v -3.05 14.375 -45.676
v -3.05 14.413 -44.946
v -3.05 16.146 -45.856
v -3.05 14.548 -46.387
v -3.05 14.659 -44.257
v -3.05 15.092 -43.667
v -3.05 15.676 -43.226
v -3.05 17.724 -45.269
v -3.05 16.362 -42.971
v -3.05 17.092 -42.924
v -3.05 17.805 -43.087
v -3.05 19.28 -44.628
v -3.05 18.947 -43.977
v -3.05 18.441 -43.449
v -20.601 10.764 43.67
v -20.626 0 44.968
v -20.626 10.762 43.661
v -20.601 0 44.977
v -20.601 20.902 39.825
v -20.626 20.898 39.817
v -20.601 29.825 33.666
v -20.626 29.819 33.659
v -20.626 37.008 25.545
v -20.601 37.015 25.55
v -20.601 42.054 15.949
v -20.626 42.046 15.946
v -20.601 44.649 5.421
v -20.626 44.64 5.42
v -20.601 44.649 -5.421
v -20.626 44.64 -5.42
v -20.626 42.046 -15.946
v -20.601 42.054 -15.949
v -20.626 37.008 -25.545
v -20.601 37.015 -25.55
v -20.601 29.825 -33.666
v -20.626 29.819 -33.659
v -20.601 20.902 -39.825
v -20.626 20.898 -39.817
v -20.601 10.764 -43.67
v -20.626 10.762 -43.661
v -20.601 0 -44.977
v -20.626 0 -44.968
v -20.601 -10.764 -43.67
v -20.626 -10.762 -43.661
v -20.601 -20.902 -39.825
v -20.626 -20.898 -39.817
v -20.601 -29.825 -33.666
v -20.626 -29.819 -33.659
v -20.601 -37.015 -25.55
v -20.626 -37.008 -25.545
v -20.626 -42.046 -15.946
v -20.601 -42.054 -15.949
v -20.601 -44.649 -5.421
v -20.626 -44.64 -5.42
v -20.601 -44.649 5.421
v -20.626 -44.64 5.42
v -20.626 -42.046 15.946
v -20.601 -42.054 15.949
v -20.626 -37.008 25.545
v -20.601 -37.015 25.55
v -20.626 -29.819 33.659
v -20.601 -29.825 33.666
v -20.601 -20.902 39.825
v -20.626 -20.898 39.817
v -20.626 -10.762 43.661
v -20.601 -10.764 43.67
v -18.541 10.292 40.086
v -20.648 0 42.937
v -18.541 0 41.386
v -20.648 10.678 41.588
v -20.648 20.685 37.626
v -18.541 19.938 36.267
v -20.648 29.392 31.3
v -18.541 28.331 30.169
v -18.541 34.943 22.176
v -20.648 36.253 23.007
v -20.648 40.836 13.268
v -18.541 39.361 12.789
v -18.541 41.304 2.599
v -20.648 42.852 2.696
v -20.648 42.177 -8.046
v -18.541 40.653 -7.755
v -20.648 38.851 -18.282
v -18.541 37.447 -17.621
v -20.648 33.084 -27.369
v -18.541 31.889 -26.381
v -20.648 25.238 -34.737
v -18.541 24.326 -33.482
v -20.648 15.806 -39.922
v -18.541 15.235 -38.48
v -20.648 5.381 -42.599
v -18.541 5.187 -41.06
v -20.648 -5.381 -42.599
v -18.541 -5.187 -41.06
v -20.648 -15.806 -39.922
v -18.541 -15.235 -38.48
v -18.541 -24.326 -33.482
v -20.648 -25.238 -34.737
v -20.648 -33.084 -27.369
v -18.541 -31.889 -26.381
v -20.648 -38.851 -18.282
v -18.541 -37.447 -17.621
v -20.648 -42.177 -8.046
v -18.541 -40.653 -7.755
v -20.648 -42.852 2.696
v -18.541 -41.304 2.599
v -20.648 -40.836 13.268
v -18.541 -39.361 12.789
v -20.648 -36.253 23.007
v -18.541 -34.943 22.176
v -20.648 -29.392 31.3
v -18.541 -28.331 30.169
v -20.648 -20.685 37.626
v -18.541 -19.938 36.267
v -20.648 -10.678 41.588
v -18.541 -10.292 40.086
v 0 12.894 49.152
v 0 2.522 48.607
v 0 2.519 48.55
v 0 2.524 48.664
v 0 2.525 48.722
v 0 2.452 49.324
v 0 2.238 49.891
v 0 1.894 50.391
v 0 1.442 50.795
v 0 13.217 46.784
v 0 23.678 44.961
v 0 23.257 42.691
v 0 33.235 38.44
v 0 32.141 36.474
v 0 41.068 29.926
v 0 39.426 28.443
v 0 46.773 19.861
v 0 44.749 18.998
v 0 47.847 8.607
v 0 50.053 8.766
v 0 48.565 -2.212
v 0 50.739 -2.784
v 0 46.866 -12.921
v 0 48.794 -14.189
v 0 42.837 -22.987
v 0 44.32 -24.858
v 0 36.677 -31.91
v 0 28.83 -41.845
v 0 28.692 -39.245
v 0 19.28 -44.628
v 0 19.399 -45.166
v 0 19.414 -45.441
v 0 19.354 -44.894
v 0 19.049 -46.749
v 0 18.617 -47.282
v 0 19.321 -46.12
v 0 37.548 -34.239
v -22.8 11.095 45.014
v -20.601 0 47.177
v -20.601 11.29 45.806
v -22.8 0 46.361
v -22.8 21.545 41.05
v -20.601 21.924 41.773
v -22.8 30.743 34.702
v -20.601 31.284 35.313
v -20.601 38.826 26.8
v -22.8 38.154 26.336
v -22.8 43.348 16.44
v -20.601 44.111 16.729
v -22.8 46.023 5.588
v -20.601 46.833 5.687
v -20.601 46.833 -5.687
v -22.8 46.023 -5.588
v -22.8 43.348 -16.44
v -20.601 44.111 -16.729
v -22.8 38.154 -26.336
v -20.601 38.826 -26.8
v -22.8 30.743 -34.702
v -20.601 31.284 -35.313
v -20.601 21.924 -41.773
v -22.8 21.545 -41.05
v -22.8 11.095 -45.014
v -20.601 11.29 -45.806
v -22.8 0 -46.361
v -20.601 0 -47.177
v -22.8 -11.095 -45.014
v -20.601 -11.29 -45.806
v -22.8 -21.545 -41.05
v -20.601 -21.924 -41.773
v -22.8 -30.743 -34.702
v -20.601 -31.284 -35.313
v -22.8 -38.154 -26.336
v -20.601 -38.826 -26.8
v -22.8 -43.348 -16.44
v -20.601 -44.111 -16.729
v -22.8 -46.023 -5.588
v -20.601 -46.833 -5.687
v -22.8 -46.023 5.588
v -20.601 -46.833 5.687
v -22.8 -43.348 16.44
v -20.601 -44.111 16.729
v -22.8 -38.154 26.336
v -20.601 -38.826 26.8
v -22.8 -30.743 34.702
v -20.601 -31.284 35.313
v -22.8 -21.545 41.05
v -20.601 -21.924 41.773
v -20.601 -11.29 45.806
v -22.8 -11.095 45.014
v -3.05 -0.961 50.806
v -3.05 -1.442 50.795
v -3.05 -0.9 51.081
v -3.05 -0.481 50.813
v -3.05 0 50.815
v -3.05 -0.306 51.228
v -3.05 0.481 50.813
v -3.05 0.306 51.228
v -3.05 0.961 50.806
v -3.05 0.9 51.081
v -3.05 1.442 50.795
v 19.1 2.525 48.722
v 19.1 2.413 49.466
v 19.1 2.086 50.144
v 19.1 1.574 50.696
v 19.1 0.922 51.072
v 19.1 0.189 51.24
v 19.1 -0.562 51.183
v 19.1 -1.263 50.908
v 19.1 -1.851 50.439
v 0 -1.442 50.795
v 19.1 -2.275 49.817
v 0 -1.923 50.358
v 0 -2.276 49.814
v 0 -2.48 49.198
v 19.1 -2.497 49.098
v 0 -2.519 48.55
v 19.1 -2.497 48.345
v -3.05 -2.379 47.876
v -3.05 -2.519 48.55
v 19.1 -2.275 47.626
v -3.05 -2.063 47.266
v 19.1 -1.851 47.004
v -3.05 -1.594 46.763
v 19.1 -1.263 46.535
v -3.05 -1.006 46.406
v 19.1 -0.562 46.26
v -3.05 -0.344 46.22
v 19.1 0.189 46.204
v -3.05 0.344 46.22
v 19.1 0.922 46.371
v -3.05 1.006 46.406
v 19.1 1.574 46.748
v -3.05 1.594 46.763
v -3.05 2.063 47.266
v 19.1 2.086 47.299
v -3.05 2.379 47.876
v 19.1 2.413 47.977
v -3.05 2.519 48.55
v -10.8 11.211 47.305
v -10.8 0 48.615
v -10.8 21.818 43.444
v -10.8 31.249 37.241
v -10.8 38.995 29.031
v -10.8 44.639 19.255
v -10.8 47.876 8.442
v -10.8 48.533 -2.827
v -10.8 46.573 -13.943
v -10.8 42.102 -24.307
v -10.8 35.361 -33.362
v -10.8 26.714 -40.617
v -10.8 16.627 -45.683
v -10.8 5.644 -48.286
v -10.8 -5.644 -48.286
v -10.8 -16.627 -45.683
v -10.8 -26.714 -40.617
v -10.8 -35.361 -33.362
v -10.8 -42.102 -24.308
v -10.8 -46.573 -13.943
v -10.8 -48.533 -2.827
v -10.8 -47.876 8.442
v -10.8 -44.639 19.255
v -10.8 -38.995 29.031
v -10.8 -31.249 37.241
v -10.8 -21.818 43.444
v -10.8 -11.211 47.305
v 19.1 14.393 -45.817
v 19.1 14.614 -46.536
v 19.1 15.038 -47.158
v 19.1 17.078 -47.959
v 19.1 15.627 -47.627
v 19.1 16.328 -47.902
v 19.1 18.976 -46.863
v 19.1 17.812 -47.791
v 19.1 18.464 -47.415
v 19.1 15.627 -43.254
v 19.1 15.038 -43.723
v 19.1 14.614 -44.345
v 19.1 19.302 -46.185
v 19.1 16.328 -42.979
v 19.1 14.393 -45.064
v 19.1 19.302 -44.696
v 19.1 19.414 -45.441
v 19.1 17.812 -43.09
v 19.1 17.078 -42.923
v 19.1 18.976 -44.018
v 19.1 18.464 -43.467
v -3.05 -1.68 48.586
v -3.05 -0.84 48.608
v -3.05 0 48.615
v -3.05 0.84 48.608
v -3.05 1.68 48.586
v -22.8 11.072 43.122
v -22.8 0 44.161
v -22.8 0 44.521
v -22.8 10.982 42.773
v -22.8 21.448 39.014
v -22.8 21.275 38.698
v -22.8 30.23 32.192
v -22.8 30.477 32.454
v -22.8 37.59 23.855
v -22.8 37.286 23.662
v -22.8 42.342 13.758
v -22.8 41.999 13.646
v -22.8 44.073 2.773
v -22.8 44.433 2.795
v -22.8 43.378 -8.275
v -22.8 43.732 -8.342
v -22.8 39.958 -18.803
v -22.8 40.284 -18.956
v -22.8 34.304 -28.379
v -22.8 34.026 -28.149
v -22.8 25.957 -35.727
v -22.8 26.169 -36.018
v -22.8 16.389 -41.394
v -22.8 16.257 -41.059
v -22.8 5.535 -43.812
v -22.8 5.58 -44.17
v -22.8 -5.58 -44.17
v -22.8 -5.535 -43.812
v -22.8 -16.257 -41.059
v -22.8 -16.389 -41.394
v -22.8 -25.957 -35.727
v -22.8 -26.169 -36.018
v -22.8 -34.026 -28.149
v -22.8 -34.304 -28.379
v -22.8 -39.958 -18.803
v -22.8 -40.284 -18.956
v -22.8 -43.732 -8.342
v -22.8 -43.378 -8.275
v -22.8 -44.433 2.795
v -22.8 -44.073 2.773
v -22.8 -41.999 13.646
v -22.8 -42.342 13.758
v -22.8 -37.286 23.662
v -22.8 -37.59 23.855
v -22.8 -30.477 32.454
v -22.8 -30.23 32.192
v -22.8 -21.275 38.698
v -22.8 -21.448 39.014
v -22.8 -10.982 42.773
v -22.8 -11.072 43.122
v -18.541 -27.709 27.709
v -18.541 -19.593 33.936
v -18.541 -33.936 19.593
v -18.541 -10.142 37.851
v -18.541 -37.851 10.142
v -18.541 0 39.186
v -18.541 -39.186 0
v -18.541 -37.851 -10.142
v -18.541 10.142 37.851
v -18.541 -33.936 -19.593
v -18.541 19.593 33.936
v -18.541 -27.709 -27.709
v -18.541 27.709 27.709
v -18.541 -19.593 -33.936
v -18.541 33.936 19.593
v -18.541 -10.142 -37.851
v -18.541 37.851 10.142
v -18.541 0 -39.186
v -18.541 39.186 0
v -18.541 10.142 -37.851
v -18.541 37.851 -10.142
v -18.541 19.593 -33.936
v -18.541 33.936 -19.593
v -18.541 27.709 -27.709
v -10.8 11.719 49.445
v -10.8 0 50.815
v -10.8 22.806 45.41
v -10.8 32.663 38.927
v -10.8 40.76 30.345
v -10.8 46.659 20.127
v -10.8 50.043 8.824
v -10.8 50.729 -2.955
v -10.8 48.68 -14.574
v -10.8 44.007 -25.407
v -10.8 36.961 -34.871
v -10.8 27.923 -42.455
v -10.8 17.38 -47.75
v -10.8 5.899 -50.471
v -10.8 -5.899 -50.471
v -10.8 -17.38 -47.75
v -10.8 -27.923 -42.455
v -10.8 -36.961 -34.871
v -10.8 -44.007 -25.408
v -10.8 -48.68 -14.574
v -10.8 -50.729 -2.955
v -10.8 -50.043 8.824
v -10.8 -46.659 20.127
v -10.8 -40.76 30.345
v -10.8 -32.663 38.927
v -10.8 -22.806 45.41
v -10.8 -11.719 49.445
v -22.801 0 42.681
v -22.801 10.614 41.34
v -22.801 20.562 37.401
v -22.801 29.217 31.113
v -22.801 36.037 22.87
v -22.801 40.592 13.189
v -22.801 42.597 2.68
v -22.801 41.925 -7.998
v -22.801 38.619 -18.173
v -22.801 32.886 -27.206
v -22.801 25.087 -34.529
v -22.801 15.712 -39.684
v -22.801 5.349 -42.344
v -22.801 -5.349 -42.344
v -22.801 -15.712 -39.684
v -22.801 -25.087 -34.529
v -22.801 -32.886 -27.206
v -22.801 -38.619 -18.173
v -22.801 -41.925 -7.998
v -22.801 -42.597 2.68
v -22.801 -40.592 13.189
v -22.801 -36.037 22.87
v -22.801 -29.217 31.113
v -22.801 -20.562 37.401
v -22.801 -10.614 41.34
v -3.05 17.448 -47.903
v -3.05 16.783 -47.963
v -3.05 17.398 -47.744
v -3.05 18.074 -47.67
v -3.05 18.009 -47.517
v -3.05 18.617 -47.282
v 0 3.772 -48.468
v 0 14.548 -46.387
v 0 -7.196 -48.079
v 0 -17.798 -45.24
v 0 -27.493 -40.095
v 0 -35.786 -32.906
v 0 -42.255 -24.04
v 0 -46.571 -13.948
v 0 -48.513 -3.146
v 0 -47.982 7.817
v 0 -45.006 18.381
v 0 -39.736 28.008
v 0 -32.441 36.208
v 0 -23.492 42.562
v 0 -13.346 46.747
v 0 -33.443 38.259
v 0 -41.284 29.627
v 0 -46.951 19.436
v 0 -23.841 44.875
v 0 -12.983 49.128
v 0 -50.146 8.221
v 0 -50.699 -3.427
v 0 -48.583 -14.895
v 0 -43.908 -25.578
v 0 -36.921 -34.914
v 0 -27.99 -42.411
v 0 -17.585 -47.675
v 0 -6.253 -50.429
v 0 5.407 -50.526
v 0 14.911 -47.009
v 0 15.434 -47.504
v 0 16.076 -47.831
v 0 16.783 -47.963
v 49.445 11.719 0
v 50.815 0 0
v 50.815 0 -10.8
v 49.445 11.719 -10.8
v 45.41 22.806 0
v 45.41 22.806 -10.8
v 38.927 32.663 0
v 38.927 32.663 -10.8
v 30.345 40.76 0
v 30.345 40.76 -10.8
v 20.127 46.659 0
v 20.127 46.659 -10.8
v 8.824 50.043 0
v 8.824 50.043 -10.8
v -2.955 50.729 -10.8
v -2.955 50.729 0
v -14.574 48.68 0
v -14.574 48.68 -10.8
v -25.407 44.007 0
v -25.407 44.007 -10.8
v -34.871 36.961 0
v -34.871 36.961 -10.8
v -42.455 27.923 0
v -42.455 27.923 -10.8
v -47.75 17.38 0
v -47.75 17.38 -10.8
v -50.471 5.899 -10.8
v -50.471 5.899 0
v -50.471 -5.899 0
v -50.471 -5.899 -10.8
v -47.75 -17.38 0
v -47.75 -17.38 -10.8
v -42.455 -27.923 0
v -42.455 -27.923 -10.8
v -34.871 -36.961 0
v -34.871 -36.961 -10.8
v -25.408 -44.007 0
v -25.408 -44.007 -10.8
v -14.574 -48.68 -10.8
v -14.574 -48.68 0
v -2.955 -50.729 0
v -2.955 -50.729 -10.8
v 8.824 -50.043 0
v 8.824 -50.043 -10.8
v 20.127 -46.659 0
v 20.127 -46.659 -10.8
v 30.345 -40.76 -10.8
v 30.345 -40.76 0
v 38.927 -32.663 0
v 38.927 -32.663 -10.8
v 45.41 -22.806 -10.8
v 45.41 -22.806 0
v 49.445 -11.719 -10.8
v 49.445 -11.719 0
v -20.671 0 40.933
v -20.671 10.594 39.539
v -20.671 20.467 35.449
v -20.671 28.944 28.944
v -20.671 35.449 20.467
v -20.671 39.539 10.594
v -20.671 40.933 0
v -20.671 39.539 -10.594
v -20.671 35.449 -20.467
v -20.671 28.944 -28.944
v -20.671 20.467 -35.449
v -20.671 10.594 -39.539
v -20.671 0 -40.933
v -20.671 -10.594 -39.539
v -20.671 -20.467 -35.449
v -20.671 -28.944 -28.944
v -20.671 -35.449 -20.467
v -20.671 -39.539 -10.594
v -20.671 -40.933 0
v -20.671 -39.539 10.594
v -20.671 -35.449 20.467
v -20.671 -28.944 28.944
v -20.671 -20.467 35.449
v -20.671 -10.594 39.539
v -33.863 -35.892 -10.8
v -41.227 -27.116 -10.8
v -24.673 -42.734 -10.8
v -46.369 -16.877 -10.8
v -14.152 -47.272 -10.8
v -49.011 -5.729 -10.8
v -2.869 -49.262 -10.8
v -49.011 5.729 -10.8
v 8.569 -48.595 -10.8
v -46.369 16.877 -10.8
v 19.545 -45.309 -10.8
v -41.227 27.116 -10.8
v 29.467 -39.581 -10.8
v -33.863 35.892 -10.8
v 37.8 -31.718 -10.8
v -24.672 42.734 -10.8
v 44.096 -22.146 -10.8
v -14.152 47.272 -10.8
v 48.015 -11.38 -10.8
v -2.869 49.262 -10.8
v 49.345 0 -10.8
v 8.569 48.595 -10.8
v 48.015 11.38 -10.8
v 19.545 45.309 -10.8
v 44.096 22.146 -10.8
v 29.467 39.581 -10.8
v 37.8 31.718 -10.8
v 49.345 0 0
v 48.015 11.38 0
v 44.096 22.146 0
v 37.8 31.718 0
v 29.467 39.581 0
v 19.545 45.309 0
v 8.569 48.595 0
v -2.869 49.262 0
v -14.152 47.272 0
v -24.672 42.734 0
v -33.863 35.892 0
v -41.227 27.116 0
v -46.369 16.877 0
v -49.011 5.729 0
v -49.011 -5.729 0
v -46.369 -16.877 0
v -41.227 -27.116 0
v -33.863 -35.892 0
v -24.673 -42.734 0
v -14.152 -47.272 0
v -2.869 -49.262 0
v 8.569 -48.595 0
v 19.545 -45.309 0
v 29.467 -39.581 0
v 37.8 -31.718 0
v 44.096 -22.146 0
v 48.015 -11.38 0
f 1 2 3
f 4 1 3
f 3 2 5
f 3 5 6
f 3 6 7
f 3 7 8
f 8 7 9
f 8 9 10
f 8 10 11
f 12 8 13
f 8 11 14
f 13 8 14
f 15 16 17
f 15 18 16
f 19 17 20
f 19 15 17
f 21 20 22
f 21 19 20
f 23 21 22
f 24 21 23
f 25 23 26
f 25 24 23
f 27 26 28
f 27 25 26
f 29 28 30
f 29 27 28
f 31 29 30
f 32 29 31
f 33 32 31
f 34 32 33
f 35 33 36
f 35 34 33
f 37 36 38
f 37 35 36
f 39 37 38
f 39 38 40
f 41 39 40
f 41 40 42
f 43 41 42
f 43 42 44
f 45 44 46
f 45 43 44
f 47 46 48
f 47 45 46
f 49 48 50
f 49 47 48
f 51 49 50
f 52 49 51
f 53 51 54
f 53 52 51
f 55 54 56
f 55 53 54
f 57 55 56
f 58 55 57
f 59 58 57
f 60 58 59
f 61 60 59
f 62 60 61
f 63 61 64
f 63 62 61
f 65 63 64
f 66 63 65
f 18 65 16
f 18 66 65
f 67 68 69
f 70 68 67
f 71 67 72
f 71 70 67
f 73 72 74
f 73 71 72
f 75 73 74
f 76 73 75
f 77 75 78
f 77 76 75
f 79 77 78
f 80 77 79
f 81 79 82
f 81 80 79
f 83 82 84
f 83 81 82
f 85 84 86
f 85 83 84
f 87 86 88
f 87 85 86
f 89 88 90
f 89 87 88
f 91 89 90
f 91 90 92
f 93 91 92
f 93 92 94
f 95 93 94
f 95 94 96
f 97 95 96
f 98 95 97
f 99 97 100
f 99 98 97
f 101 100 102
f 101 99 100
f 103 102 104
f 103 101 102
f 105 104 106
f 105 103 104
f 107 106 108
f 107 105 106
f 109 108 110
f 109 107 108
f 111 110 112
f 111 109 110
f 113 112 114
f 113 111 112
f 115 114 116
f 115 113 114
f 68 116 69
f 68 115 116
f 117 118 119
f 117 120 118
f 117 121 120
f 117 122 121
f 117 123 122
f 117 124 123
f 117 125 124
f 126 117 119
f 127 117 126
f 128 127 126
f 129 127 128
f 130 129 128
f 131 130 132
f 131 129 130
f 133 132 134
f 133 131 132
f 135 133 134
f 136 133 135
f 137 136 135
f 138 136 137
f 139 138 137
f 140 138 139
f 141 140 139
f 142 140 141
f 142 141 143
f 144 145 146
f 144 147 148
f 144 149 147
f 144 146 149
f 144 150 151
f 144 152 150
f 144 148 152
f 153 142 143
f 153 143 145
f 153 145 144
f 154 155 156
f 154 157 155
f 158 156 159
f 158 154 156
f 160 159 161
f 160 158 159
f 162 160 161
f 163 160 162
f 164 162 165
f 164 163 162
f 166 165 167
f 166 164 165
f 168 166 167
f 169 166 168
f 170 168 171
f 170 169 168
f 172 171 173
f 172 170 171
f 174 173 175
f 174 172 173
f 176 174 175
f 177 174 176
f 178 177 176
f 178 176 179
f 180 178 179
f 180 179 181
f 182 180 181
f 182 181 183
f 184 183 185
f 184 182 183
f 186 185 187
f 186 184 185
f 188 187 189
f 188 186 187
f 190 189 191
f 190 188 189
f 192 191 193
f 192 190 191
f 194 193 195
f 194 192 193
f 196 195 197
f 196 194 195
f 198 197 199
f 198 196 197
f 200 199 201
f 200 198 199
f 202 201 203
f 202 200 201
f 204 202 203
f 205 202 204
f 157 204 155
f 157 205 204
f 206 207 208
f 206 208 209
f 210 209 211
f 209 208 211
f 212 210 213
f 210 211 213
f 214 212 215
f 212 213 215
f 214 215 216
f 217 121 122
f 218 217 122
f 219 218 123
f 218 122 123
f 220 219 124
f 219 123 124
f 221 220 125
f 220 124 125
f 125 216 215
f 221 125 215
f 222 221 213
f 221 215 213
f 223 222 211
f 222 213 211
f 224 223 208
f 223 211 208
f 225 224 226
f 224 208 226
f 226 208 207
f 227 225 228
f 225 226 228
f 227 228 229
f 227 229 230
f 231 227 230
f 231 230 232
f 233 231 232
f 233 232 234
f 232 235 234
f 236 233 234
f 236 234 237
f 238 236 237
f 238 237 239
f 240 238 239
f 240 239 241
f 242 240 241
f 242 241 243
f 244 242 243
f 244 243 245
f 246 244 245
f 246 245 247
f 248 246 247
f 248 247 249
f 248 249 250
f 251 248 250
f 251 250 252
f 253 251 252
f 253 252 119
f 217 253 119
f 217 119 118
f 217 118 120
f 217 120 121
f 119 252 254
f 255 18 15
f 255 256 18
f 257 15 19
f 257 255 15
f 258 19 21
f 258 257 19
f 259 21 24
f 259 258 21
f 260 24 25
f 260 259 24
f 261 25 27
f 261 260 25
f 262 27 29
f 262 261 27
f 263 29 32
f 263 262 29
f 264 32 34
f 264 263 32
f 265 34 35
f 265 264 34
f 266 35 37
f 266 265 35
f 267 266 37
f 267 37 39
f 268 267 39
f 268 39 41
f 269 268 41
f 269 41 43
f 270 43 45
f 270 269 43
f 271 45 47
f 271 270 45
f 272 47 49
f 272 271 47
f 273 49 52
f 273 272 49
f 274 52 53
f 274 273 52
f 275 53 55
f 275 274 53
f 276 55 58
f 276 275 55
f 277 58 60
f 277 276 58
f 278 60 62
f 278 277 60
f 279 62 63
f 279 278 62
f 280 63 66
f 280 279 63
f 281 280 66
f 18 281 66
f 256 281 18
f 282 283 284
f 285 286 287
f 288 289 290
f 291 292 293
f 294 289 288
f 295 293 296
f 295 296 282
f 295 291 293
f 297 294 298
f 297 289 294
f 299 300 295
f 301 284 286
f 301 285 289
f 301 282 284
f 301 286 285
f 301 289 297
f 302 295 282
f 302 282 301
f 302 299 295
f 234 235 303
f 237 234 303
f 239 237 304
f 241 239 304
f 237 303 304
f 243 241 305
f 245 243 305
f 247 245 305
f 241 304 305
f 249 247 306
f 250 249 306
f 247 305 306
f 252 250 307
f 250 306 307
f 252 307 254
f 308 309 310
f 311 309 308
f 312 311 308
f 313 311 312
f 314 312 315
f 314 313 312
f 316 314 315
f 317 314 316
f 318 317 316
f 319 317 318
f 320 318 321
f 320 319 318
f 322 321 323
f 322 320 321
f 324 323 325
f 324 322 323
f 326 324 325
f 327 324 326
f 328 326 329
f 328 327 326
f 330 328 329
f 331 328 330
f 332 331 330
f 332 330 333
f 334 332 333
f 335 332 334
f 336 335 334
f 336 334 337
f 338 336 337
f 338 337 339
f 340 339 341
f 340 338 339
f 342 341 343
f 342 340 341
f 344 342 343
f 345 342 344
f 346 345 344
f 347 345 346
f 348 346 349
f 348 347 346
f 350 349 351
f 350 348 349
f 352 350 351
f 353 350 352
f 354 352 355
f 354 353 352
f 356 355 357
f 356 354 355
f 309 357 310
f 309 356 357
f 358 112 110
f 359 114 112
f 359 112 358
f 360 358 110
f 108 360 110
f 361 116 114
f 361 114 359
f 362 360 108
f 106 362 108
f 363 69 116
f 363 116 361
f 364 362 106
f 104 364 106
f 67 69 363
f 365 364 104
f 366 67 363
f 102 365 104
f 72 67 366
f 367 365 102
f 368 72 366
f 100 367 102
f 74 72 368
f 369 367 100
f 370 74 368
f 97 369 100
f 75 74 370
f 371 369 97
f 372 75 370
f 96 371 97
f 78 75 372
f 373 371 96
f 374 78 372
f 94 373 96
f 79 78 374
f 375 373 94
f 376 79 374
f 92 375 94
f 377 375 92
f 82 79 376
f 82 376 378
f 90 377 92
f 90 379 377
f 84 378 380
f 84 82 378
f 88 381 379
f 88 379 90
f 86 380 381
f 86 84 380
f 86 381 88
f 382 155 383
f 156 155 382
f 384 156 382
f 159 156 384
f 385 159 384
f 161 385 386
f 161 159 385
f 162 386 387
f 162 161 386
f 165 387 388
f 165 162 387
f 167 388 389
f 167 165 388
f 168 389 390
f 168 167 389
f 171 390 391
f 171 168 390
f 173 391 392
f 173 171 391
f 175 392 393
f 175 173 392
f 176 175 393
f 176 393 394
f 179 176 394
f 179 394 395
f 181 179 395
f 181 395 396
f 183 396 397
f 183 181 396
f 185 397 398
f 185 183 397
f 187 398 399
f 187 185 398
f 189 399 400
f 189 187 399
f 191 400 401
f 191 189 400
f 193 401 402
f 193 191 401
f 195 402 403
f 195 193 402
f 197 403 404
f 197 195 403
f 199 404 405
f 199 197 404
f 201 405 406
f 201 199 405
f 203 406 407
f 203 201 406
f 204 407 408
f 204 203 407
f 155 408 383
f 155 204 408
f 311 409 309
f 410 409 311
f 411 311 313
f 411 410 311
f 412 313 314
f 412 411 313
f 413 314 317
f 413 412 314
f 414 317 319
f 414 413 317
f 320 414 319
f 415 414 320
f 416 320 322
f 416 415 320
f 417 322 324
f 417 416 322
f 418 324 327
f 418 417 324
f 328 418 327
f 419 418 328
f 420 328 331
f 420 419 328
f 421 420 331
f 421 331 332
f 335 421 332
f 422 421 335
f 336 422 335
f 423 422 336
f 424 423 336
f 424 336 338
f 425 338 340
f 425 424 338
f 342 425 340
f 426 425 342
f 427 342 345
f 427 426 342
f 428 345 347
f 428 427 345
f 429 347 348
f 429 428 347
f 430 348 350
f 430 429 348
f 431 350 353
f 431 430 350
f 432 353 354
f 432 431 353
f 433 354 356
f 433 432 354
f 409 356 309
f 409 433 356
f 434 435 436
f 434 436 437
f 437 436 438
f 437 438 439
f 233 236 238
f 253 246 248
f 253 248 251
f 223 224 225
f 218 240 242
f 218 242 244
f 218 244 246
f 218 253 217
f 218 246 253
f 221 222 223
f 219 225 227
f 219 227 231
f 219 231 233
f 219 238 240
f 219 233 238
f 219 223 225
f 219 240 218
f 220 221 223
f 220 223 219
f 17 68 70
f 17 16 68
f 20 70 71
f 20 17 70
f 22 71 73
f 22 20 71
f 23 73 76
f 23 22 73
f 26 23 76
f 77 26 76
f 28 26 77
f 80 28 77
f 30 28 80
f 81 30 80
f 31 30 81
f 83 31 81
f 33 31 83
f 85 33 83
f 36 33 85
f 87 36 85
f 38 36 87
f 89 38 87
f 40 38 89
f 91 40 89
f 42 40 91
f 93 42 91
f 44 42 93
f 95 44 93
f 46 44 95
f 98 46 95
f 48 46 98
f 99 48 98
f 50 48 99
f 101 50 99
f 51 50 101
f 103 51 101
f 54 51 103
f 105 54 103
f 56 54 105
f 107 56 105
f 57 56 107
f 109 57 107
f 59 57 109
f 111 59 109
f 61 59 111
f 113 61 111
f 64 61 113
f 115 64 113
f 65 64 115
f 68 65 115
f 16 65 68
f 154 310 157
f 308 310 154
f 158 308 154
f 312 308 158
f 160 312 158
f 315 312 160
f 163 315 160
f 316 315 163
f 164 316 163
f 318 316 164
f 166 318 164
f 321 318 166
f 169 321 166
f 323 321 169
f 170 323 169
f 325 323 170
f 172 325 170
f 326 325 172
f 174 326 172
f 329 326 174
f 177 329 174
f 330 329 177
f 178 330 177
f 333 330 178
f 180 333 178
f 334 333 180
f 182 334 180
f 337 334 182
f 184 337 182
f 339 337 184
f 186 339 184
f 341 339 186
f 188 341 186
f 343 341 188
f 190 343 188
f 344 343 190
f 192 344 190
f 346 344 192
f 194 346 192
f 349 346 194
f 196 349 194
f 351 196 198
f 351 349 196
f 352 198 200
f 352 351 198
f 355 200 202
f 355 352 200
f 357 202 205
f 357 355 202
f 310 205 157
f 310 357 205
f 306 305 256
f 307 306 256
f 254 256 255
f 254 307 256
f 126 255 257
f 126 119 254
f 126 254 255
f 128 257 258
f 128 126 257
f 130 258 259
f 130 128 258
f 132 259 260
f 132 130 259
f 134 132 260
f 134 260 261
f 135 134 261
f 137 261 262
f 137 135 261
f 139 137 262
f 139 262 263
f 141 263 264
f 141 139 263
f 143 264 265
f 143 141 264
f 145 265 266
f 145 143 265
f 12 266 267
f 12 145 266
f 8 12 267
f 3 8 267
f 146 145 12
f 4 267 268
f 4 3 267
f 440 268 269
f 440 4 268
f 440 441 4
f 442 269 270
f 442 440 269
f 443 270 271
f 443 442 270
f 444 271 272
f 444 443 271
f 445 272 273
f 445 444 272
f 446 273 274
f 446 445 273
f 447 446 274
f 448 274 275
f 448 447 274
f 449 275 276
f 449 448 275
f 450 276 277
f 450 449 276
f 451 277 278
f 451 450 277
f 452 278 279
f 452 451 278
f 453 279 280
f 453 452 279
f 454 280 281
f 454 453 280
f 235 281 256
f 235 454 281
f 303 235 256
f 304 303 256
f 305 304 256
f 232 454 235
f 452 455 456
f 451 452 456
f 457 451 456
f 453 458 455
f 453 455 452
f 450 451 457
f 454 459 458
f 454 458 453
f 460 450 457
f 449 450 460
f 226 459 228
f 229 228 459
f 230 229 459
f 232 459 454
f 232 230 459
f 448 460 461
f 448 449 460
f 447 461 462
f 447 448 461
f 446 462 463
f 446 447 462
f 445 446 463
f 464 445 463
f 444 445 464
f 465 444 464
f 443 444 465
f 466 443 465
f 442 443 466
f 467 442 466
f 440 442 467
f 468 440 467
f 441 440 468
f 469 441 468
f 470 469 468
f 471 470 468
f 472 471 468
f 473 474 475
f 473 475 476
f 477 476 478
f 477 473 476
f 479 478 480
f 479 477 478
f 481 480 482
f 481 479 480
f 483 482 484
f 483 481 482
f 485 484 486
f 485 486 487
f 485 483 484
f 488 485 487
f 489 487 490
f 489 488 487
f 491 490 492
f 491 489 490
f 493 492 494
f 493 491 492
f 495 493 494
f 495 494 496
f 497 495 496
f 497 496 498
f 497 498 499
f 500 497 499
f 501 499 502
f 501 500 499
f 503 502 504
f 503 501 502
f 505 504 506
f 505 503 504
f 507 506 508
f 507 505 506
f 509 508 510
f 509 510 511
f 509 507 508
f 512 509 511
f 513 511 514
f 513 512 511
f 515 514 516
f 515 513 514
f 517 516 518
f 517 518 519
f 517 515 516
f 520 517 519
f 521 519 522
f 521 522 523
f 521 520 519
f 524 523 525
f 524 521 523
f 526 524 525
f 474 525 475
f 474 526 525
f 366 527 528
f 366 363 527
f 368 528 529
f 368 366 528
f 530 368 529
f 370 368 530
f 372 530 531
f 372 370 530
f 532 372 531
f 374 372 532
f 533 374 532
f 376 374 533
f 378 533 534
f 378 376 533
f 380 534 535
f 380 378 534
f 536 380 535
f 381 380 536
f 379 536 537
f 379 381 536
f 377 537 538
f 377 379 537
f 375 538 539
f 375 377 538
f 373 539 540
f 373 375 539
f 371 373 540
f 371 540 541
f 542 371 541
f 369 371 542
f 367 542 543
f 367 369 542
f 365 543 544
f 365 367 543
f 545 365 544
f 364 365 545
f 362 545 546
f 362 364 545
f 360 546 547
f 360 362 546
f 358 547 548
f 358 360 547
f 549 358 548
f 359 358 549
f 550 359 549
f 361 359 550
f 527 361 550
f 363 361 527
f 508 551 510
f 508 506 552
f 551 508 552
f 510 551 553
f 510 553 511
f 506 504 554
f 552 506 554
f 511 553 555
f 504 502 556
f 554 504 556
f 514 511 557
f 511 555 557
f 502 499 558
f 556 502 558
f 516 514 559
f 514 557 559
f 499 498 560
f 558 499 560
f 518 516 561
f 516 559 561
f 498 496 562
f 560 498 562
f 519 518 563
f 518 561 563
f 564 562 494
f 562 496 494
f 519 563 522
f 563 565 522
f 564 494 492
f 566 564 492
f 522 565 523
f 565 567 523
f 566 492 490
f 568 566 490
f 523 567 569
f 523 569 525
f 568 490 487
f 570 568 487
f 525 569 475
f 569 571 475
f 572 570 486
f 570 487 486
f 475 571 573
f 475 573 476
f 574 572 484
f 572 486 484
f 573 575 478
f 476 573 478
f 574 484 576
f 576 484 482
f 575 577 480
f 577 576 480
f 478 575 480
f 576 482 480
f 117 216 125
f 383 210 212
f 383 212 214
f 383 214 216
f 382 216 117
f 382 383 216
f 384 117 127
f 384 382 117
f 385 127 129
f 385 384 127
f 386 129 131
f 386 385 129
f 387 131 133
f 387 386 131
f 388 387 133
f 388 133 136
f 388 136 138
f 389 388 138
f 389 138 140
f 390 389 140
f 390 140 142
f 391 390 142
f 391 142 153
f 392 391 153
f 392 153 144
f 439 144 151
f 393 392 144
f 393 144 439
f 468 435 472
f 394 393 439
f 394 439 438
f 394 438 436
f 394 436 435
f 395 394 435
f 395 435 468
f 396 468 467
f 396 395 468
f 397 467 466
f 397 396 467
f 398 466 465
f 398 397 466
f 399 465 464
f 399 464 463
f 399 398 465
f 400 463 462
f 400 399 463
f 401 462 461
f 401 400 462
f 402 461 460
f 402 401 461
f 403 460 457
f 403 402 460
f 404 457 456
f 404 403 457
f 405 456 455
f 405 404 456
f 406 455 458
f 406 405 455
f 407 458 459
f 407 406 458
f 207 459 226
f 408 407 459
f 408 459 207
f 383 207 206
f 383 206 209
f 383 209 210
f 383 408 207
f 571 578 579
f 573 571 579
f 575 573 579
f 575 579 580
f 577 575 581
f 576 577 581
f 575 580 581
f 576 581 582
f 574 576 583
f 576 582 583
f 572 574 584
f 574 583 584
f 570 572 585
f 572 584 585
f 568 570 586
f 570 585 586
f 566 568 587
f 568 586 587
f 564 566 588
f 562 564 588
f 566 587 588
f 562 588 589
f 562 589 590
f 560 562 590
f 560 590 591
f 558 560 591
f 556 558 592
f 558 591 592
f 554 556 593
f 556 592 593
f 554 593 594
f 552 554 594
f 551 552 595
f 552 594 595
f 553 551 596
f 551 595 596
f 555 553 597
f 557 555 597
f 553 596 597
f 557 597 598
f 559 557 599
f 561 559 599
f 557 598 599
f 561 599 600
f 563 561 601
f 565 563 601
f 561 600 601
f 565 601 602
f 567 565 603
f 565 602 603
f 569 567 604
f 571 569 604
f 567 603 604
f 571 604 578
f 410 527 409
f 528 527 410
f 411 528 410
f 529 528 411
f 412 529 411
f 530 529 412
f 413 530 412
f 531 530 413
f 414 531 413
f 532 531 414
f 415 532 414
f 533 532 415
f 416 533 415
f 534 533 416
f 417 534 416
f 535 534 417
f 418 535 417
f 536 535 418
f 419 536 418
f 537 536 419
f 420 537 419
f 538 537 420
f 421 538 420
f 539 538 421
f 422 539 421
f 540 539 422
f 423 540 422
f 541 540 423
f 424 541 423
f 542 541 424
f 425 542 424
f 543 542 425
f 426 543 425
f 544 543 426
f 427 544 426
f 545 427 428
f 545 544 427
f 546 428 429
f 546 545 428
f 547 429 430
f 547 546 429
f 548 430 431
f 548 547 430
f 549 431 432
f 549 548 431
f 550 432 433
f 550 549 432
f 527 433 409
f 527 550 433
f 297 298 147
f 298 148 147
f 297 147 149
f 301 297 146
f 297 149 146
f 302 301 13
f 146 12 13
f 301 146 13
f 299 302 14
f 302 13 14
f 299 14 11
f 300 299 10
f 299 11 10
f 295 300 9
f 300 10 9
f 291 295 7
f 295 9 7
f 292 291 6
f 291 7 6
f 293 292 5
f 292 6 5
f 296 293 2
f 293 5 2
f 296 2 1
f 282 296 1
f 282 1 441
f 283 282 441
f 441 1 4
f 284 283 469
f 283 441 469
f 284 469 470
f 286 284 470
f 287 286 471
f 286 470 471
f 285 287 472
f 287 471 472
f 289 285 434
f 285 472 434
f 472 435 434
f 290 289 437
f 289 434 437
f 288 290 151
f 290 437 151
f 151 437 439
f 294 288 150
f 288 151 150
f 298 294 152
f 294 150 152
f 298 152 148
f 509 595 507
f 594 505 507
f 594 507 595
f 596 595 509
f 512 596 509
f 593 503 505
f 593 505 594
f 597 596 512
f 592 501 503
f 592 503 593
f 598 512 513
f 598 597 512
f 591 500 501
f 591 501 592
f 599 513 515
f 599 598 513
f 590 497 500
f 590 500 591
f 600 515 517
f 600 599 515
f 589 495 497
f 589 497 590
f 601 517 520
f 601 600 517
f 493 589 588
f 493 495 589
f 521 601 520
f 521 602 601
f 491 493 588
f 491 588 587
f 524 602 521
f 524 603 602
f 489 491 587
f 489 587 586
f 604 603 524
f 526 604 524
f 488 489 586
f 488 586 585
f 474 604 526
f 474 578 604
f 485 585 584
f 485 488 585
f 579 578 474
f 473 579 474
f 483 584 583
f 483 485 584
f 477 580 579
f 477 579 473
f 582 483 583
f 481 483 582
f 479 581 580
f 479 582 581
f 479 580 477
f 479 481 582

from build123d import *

# Parameters (mm, degrees)
F0_R      = 50.815
F0_R_2    = 49.345
F1_DEPTH  = 10.8
F4_R      = 2.525
F5_DEPTH  = 18.8
F6_DEPTH  = 3.05
F7_R      = 2.525
F8_DEPTH  = 19.1
F9_DEPTH  = 3.05
F10_DEPTH = 19.1


with BuildPart() as f1:
    # F0 (on Top) → F1 (new body)
    with BuildSketch(Plane.XY):
        Circle(F0_R)
        Circle(F0_R_2, mode=Mode.SUBTRACT)
    extrude(amount=-F1_DEPTH)


with BuildPart() as f3:
    # F2 (on Front) → F3 (revolve)
    with BuildSketch(Plane.XZ):
        Polygon((0, 48.615), (0, 50.815), (-10.8, 50.815), (-20.6008047741, 47.1770952301), (-20.6008047741, 44.9770952301), (-10.8, 48.615), align=None)
        Polygon((-20.6483412873, 42.9370863552), (-22.4750889607, 44.2813903834), (-22.8004810661, 44.1606099456), (-22.800804627, 42.6807885977), (-20.6708046779, 40.9334691601), align=None)
        Polygon((-18.5408047288, 41.3861497226), (-20.6483412873, 42.9370863552), (-20.6708046779, 40.9334691601), (-18.5408047288, 39.1861497226), align=None)
        Polygon((-20.6483412873, 42.9370863552), (-20.6255729673, 44.9679016659), (-22.4750889607, 44.2813903834), align=None)
        Polygon((-20.6255729673, 44.9679016659), (-20.6008047741, 47.1770952301), (-22.8, 46.3607885097), (-22.8004023135, 44.5207885537), (-22.4750889607, 44.2813903834), align=None)
        Polygon((-22.4750889607, 44.2813903834), (-22.8004023135, 44.5207885537), (-22.8004810661, 44.1606099456), align=None)
        Polygon((-20.6008047741, 44.9770952301), (-20.6008047741, 47.1770952301), (-20.6255729673, 44.9679016659), align=None)
    revolve(axis=Axis((-10.9746353701, 0, 0), (-1, 0, 0)))

    # F4 (on Right) → F5 (join)
    with BuildSketch(Plane.YZ):
        with Locations((0, 48.7216291603)):
            Circle(F4_R)
    extrude(amount=F5_DEPTH)

    # F4 (on Right) → F6 (join)
    with BuildSketch(Plane.YZ):
        with Locations((0, 48.7216291603)):
            Circle(F4_R)
    extrude(amount=-F6_DEPTH)

    # F7 (on Right) → F8 (join)
    with BuildSketch(Plane.YZ):
        with Locations((16.8893956308, -45.4406320229)):
            Circle(F7_R)
    extrude(amount=F8_DEPTH)

    # F7 (on Right) → F9 (join)
    with BuildSketch(Plane.YZ):
        with Locations((16.8893956308, -45.4406320229)):
            Circle(F7_R)
    extrude(amount=-F9_DEPTH)

    # F4 (on Right) → F10 (join)
    with BuildSketch(Plane.YZ):
        with Locations((0, 48.7216291603)):
            Circle(F4_R)
    extrude(amount=F10_DEPTH)


solid = Compound([f1.part, f3.part])
